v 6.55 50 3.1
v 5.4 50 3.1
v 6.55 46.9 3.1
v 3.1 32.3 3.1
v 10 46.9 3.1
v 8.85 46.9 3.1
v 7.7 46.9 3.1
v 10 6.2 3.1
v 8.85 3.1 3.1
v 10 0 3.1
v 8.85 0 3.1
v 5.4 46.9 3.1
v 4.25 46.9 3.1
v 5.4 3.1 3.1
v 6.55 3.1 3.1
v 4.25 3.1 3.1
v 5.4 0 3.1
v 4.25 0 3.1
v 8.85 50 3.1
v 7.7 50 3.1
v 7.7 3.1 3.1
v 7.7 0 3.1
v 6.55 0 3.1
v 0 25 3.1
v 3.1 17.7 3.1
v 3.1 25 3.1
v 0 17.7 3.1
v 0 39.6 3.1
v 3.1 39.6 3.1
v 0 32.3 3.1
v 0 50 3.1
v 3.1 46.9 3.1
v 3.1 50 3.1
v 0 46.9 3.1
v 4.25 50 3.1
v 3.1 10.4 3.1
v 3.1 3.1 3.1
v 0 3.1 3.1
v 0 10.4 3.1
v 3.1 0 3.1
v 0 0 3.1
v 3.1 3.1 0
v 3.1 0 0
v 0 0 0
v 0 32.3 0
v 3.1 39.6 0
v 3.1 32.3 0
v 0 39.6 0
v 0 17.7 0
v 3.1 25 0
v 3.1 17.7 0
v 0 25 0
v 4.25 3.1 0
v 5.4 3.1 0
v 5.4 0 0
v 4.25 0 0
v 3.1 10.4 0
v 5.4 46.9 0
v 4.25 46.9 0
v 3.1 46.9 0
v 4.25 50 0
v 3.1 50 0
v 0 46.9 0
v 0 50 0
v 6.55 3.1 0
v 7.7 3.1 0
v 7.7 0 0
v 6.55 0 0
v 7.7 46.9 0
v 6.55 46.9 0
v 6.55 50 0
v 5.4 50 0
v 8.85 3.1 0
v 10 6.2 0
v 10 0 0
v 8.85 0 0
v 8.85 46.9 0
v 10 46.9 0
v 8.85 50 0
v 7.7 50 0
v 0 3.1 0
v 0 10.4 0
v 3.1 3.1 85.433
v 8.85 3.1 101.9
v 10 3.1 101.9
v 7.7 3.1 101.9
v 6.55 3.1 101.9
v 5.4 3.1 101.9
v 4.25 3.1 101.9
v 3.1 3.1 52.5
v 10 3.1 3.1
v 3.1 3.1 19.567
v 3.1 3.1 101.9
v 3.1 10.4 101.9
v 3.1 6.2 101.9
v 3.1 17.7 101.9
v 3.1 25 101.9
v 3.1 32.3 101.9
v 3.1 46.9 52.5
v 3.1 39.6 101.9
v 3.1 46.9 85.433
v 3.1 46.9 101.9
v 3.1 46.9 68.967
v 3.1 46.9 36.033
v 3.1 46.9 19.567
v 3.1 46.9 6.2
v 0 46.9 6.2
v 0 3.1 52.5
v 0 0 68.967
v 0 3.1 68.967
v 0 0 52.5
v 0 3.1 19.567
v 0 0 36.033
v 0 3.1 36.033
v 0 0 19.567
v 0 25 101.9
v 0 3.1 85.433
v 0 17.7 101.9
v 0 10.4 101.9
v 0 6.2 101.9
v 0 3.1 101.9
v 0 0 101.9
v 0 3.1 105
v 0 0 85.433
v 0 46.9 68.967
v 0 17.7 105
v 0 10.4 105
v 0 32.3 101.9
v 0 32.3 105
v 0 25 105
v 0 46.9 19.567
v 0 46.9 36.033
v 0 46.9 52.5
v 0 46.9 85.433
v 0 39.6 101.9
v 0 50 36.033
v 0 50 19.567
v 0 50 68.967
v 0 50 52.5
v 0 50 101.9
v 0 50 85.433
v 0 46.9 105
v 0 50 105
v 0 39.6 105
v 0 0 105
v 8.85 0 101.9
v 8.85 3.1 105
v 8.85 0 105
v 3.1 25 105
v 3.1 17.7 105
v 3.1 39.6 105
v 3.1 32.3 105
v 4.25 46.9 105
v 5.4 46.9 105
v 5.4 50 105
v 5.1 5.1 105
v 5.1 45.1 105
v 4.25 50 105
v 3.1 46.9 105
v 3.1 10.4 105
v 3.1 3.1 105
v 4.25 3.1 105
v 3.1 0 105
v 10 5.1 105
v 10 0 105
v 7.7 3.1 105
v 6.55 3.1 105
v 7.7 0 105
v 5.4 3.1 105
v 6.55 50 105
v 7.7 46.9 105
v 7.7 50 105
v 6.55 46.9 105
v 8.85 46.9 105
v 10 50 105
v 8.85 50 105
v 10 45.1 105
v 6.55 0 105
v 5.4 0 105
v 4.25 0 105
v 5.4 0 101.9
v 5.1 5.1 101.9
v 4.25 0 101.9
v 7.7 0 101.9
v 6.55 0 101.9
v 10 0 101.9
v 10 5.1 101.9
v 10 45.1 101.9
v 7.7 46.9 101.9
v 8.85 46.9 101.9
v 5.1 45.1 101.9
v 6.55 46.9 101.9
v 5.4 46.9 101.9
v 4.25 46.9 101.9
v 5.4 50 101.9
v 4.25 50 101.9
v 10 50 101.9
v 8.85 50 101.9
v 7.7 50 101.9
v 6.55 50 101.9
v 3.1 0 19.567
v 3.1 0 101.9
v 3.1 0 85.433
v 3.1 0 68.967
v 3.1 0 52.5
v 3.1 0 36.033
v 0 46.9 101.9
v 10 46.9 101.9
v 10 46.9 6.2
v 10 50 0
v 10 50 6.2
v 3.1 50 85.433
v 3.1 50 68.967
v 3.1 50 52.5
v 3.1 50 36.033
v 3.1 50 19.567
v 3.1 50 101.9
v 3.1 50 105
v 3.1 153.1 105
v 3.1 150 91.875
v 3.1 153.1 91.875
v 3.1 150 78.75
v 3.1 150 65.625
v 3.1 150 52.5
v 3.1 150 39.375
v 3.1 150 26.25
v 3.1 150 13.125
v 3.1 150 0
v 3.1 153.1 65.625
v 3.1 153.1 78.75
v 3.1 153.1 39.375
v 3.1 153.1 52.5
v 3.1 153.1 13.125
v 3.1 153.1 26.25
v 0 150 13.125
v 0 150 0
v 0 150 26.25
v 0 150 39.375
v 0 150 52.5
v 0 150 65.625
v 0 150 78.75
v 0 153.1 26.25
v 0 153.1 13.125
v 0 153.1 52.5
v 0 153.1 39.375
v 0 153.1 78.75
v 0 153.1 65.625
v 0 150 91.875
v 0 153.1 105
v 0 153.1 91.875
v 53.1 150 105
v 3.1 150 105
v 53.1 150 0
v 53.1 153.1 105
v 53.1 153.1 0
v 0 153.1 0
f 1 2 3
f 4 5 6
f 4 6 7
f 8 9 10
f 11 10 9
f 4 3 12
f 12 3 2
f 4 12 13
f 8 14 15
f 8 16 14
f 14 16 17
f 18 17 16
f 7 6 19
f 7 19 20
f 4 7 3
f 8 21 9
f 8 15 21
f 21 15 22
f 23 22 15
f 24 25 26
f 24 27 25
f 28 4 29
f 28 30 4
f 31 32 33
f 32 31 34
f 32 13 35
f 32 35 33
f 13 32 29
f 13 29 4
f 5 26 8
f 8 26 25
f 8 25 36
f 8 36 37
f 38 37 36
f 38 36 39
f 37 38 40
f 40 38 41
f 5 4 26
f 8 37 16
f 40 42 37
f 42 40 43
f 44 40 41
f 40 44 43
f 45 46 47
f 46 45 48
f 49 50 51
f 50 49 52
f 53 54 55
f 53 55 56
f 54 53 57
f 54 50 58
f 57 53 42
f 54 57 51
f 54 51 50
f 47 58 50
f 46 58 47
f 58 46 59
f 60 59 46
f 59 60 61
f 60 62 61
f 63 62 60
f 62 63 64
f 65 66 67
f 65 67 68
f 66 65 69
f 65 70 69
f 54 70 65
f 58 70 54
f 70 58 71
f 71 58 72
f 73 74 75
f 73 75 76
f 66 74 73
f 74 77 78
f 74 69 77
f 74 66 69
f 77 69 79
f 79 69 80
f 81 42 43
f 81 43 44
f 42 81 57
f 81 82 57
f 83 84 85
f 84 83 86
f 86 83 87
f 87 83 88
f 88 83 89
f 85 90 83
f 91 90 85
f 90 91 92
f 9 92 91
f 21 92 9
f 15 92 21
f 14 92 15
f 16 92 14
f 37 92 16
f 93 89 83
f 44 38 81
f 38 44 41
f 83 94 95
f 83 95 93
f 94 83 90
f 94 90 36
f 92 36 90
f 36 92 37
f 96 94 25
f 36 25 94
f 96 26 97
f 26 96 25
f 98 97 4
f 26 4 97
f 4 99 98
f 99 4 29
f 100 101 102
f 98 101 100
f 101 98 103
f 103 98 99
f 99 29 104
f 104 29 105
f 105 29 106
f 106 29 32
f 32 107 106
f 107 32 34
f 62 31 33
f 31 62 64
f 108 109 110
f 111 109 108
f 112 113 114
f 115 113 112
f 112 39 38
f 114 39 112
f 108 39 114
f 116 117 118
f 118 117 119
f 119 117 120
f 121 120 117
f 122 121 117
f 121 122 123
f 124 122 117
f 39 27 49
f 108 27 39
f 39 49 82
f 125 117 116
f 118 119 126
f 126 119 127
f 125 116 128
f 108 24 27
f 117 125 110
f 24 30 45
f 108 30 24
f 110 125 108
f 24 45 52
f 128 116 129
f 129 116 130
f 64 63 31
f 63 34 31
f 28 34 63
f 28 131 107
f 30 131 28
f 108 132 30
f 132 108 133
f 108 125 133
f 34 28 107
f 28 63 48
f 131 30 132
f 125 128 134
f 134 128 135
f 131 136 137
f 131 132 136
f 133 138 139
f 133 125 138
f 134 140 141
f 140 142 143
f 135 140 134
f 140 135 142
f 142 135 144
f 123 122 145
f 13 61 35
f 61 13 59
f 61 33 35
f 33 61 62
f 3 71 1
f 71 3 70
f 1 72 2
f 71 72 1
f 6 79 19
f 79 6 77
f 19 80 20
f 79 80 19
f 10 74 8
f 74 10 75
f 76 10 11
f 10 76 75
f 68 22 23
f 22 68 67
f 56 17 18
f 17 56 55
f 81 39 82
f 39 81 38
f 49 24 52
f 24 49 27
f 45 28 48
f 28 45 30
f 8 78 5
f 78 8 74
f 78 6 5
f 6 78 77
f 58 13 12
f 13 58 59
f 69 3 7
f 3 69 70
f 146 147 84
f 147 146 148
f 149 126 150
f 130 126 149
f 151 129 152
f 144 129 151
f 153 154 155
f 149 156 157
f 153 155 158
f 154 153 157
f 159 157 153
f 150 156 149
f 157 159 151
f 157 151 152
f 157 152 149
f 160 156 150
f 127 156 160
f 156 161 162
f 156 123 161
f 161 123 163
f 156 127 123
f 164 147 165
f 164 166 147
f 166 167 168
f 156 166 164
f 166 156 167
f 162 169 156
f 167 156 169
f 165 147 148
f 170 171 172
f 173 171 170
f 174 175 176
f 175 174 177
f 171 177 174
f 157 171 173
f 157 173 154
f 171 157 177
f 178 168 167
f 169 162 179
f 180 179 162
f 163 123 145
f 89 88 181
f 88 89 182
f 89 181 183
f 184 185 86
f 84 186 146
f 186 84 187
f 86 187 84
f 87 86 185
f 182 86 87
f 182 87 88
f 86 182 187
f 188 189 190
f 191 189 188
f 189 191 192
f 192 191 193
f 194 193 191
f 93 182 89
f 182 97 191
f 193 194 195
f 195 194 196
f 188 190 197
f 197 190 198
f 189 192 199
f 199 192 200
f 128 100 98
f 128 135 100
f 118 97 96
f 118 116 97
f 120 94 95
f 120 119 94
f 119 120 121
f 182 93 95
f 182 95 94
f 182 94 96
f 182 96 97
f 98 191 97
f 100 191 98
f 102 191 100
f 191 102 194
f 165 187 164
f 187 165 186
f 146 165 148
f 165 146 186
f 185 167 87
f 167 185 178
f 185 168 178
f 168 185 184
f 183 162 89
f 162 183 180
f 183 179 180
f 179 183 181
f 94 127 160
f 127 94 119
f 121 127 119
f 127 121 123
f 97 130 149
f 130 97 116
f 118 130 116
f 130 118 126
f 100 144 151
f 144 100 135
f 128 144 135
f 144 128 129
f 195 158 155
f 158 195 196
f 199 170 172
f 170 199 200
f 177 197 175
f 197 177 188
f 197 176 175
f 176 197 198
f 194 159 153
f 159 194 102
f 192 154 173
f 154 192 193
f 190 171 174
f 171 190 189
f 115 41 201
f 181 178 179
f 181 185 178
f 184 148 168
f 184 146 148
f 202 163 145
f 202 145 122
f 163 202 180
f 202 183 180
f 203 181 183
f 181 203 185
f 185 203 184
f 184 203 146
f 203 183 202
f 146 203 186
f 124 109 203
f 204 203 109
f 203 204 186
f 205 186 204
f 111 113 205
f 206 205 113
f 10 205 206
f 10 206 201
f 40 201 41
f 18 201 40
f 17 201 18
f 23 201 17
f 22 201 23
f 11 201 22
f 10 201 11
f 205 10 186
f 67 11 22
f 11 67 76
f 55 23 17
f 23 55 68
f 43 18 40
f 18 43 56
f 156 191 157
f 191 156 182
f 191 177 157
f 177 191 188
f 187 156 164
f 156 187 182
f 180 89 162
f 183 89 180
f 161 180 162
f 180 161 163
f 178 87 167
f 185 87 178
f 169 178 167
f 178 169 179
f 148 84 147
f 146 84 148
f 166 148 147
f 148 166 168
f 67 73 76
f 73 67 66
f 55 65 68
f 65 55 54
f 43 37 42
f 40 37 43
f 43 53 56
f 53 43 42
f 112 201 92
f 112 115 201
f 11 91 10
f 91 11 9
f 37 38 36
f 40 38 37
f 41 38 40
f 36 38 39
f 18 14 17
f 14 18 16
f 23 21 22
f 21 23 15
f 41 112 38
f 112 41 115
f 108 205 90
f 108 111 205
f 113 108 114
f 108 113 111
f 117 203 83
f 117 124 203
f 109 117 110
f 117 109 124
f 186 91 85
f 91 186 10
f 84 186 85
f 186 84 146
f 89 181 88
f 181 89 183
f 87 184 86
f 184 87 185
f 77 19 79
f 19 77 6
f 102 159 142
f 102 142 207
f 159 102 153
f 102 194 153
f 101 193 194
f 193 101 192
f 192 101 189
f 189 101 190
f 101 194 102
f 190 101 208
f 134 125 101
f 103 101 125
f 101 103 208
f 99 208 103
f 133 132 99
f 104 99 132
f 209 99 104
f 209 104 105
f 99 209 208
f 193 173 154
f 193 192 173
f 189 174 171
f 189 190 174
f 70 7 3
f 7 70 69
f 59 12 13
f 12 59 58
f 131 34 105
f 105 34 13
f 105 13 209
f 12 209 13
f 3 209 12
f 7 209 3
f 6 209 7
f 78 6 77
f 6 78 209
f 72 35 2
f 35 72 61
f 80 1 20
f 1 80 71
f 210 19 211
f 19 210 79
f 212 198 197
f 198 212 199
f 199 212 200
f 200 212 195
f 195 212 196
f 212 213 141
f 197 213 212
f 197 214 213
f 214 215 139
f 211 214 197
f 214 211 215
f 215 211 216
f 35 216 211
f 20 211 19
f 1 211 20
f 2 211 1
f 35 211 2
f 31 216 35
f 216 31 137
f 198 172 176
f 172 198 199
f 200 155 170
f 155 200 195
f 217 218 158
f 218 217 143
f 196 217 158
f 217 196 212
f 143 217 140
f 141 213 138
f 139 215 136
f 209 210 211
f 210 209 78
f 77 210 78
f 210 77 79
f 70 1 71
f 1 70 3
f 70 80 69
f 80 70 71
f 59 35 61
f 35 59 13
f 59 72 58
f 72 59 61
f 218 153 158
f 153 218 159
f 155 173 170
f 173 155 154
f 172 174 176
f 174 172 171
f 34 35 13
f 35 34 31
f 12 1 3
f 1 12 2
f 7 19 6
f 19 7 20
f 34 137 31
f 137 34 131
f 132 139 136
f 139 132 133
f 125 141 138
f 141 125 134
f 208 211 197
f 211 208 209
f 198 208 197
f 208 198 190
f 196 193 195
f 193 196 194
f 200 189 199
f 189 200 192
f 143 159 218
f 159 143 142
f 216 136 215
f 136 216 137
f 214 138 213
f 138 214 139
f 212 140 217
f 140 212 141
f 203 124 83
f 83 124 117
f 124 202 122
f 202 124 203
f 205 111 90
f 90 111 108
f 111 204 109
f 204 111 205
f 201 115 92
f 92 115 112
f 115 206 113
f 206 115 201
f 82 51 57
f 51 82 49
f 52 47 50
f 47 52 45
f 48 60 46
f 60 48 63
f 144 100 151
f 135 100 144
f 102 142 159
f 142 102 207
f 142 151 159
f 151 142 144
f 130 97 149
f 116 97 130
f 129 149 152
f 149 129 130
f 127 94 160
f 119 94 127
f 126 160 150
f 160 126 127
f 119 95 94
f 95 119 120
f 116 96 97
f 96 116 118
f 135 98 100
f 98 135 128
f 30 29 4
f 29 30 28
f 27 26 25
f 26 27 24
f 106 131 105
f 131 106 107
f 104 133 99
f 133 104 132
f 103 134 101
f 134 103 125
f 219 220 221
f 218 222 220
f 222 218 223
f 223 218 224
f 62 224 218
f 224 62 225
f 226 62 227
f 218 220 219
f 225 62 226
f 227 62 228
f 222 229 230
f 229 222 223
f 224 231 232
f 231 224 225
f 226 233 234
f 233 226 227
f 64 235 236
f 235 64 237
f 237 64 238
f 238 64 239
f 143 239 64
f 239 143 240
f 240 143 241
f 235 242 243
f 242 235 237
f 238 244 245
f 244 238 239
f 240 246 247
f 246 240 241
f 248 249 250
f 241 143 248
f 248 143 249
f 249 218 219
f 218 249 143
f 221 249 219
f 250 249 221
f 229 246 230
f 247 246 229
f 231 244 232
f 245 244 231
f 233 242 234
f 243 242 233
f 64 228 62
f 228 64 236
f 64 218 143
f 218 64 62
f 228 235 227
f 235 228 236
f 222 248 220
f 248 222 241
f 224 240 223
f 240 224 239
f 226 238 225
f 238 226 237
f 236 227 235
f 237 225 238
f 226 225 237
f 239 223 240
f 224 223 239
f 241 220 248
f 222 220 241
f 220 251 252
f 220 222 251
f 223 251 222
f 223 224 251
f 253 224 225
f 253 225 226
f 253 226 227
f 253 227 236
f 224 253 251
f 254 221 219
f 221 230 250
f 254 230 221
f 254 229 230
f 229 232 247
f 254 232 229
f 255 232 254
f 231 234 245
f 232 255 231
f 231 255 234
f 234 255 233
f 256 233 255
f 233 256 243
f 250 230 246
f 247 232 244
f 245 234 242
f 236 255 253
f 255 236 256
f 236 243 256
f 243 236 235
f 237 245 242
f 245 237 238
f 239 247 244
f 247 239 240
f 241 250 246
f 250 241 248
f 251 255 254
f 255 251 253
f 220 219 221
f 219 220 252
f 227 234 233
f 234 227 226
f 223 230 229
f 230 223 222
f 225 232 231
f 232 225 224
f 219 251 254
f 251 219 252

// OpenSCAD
include <lasercut.scad>; 

thickness = 3.1;
head_thickness = 100;
led_x = 105;
led_y = 50;
led_z = 10;

module ledBox()
{
    color("Gold", 0.5) {
        union() {
            lasercutoutBox(thickness = thickness, x=led_z, y=led_y, z=led_x, 
                sides=5, num_fingers=3,
                circles_remove = [
                    [[3, led_z+thickness, led_y/5]],
                ],
                cutouts_a = [
                    [],
                    [[2,2,10,40]],
                ]
            );
            translate([0,led_y,led_x]) rotate([0,90,0]) 
                lasercutoutSquare(thickness=thickness, x=led_x, y=head_thickness,
                    finger_joints = [
                        [UP, 1, 4]
                    ]
            );

        }
        
        translate([thickness,led_y+head_thickness+thickness,0]) rotate([90,0,0]) 
            lasercutoutSquare(thickness=thickness, x=50, y=led_x,
                finger_joints = [
                    [LEFT, 1, 4]
                ]
        );
    }
}
translate([0,0,0]) ledBox();
